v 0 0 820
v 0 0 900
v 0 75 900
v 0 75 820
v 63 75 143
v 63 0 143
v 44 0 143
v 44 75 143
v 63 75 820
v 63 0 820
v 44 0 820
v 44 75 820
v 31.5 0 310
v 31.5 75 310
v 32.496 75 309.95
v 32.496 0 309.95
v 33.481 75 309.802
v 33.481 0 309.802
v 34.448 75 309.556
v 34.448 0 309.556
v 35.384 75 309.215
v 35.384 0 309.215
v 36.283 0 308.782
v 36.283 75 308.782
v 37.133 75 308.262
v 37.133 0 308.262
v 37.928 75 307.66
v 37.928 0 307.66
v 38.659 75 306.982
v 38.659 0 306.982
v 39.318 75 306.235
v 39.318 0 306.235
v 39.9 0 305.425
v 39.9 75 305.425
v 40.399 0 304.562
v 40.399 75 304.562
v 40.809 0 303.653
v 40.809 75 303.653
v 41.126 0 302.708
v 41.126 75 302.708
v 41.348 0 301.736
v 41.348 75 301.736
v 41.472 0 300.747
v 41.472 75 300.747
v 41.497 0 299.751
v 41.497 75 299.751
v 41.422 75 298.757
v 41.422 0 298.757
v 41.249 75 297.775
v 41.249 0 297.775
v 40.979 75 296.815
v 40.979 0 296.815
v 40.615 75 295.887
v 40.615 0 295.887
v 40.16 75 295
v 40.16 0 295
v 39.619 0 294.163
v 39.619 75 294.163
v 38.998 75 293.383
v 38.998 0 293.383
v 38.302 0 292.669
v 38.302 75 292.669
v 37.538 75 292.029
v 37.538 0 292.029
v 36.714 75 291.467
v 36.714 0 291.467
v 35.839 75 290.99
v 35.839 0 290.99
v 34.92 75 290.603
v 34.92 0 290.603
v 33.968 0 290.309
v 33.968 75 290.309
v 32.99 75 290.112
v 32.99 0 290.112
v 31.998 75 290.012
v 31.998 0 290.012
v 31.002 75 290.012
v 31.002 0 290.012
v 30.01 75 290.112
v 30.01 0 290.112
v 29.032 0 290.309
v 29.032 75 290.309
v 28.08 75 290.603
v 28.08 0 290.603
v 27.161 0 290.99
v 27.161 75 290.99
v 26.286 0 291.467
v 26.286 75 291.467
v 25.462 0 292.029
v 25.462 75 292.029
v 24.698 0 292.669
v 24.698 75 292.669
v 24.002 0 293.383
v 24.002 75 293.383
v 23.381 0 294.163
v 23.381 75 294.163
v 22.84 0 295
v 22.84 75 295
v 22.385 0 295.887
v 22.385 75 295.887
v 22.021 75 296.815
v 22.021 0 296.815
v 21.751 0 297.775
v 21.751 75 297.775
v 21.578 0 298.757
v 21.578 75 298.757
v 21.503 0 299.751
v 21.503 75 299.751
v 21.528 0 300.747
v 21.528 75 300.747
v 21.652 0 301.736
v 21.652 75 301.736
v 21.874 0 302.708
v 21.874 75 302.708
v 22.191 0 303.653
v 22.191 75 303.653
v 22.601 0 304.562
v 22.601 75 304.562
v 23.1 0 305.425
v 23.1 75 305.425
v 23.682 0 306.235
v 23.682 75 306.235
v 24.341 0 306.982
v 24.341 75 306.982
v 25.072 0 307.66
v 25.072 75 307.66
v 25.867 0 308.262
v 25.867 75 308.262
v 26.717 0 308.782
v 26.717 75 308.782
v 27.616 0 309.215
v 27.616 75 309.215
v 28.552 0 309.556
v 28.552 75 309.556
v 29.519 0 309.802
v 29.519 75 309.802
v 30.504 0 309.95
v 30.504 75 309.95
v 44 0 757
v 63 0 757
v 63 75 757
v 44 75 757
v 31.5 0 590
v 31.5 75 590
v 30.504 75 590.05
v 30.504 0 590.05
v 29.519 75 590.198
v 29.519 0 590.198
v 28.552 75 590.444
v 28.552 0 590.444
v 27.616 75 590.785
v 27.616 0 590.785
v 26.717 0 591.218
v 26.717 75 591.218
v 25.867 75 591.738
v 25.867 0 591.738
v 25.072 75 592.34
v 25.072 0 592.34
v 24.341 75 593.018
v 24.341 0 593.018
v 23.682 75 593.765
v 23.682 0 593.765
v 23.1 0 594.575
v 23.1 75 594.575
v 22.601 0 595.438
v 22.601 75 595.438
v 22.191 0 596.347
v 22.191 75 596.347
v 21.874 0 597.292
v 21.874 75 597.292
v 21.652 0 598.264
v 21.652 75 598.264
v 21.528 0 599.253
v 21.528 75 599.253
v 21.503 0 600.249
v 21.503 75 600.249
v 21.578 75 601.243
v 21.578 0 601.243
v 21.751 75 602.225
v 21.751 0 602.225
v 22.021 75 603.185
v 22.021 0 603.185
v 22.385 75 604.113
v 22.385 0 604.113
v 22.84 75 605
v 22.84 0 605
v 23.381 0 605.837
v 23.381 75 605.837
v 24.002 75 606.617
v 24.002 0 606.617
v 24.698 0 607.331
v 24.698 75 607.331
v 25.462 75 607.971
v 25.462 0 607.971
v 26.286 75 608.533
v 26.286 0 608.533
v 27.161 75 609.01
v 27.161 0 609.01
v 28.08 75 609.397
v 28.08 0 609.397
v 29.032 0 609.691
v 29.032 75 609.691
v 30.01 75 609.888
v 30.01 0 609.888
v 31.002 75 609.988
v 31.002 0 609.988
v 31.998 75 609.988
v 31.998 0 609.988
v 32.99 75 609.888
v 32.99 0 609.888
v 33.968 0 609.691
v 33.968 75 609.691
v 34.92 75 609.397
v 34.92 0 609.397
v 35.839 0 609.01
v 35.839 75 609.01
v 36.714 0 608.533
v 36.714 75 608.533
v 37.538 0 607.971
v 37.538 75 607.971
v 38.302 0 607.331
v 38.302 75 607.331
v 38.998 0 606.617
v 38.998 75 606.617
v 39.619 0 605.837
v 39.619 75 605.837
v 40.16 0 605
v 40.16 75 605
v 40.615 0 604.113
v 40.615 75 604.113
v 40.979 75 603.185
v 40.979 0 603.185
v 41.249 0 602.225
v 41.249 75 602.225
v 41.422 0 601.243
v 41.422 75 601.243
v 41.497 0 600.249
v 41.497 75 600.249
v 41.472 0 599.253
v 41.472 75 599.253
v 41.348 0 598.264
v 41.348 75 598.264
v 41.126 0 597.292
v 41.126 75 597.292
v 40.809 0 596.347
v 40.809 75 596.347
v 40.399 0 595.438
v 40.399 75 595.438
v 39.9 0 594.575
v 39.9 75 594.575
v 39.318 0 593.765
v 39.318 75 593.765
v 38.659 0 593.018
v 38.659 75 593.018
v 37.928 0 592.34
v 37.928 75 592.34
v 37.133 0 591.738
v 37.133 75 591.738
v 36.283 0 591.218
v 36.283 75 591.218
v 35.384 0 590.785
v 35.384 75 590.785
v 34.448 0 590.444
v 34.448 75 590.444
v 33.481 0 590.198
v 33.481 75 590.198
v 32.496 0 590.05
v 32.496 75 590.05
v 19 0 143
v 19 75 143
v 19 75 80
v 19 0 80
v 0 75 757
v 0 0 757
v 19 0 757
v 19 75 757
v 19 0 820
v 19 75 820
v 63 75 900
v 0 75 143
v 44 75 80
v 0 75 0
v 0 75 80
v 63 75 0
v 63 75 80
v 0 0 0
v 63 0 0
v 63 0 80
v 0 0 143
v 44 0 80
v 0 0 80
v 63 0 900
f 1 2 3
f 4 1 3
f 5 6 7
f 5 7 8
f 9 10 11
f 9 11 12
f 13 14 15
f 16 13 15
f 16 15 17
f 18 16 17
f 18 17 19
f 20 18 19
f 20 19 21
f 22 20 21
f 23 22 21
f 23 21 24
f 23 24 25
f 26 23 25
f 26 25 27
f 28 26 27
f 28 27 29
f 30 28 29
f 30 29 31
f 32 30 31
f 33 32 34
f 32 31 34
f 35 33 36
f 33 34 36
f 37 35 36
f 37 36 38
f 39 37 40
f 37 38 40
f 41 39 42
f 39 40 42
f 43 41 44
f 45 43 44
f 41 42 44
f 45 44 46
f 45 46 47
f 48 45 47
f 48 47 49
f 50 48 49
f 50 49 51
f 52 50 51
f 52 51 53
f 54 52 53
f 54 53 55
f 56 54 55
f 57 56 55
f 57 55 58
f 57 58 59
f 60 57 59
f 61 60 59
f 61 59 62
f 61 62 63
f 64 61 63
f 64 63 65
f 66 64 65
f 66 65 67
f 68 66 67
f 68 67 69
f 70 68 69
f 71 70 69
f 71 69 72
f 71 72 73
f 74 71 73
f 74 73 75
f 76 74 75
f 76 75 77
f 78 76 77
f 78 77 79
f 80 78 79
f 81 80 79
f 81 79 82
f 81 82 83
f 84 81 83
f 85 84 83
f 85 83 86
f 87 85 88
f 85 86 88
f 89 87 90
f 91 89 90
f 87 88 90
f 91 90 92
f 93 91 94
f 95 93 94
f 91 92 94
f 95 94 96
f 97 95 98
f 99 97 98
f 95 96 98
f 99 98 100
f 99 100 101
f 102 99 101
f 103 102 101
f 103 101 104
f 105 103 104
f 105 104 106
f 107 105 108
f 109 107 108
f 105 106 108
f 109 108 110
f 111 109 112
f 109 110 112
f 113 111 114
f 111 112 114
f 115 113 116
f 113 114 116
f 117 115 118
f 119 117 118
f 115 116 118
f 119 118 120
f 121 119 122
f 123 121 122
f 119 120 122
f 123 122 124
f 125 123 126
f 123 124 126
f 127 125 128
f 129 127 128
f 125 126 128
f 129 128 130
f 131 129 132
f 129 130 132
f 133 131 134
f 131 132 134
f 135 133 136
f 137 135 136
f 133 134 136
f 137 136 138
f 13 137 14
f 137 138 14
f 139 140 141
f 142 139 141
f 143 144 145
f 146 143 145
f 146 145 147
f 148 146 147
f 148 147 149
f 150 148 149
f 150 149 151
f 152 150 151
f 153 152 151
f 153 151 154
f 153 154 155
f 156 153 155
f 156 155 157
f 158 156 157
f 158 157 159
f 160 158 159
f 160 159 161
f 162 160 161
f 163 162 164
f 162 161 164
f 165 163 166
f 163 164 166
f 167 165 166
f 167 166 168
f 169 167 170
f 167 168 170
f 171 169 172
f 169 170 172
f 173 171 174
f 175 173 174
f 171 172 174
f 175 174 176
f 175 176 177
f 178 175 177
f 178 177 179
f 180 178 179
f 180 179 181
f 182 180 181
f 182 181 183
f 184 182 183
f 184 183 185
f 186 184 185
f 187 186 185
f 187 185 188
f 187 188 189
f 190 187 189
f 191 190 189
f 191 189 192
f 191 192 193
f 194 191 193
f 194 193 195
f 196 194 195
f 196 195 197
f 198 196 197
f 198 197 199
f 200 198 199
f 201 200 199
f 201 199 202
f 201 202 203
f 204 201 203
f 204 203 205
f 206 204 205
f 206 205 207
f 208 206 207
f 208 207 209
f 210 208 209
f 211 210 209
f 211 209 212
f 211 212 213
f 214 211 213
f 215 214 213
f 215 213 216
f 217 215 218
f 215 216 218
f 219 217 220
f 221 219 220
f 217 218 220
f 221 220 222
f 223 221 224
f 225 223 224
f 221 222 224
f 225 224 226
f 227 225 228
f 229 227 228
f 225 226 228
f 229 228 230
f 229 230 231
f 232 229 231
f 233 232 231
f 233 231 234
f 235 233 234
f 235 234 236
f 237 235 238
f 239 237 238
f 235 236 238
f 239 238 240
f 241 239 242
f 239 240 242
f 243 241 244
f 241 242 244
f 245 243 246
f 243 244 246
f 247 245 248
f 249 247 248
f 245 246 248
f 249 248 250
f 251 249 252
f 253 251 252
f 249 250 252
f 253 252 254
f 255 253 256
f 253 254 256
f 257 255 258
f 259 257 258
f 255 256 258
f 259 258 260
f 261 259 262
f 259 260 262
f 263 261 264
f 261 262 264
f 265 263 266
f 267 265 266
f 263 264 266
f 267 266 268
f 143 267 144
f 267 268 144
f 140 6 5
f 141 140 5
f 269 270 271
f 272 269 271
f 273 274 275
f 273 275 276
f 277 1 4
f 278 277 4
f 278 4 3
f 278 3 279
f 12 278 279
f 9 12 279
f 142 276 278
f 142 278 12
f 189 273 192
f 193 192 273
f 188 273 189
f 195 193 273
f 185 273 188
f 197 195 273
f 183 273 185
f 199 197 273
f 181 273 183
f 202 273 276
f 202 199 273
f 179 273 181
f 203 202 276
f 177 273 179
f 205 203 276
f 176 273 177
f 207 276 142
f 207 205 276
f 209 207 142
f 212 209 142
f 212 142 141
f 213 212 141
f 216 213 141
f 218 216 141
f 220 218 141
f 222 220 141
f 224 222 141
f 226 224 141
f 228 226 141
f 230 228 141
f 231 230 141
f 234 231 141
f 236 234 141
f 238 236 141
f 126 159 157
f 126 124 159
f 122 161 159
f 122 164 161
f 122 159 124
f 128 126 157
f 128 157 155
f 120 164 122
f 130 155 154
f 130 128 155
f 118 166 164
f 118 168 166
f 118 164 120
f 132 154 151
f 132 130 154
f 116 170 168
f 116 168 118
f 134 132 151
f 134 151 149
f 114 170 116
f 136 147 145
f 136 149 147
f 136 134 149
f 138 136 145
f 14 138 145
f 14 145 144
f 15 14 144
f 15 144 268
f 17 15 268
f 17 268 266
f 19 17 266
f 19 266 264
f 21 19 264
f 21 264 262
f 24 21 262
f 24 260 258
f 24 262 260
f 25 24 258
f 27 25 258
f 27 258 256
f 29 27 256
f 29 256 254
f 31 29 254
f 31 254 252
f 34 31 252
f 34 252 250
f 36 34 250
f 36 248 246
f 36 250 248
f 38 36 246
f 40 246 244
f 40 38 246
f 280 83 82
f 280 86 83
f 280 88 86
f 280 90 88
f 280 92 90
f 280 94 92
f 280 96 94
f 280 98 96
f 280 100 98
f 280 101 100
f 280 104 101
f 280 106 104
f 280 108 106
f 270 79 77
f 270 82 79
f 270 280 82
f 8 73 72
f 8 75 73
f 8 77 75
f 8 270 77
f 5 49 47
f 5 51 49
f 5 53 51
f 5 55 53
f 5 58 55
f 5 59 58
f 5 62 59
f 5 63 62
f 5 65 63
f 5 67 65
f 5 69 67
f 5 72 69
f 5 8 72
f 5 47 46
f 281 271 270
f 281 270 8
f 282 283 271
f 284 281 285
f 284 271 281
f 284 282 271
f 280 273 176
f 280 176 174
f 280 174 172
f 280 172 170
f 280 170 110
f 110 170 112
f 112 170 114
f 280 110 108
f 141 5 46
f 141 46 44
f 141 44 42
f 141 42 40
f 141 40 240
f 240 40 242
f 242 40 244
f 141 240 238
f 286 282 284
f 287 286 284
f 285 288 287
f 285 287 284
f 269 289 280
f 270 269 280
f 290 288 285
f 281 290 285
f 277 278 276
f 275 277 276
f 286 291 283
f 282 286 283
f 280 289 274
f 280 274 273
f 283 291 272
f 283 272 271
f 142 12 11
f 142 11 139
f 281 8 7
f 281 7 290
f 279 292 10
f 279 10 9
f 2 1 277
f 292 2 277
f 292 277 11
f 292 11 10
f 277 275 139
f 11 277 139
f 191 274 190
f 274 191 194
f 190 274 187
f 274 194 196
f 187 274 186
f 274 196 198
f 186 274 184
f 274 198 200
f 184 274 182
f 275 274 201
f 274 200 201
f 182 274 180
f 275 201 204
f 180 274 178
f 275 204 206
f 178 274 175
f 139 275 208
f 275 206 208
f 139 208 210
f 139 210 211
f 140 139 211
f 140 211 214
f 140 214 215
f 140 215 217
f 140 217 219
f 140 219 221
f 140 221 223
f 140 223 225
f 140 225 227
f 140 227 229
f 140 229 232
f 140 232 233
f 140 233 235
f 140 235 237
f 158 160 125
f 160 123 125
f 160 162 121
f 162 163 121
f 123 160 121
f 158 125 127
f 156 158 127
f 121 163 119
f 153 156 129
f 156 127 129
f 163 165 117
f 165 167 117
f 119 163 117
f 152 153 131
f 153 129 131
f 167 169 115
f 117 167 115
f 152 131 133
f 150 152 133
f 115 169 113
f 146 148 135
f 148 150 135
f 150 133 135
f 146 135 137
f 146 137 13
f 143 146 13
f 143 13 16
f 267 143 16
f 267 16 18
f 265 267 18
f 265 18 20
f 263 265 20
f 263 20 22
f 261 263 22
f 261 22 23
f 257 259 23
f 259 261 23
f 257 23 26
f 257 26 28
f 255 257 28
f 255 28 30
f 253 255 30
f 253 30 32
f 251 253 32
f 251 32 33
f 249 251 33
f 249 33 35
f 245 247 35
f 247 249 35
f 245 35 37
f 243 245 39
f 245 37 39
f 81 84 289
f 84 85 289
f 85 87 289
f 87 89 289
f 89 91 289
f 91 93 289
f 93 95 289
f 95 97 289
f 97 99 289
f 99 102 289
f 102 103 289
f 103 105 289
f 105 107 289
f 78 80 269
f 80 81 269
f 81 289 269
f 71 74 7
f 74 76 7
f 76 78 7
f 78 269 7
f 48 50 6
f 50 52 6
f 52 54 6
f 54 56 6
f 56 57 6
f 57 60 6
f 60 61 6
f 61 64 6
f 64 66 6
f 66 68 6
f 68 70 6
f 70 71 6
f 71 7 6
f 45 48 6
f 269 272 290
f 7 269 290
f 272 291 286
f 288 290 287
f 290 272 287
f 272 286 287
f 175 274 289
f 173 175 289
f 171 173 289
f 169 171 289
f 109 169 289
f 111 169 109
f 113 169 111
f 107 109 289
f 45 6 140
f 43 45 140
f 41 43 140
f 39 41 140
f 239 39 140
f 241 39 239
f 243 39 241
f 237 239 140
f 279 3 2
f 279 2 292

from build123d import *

# Parameters (mm, degrees)
ESQUISSE1_W             = 63
ESQUISSE1_H             = 75
BOSS_EXTRU_1_DEPTH      = 900
ESQUISSE2_W             = 63
ESQUISSE2_H             = 75
ENL_V_MAT_EXTRU_1_DEPTH = 19
ENL_V_START             = -63
ESQUISSE2_2_W           = 63
ESQUISSE2_2_H           = 75
ENL_V_MAT_EXTRU_2_DEPTH = 19
ESQUISSE3_R             = 10
ENL_V_MAT_EXTRU_3_DEPTH = 906.31431006


with BuildPart() as part:
    # Esquisse1 → Boss.-Extru.1 (new body)
    with BuildSketch(Plane.XY):
        with Locations((31.5, 37.5)):
            Rectangle(ESQUISSE1_W, ESQUISSE1_H)
    extrude(amount=BOSS_EXTRU_1_DEPTH)

    # Esquisse2 → Enlèv. mat.-Extru.1 (cut)
    with BuildSketch(Plane(origin=(63, 0, 0), x_dir=(0, 0, -1), z_dir=(1, 0, 0))):
        with Locations((-788.5, 37.5)):
            Rectangle(ESQUISSE2_W, ESQUISSE2_H)
        with Locations((-111.5, 37.5)):
            Rectangle(ESQUISSE2_W, ESQUISSE2_H)
    extrude(amount=-ENL_V_MAT_EXTRU_1_DEPTH, mode=Mode.SUBTRACT)

    # Esquisse2<2> → Enlèv. mat.-Extru.2 (cut)
    with BuildSketch(Plane(origin=(63, 0, 0), x_dir=(0, 0, -1), z_dir=(1, 0, 0)).offset(ENL_V_START)):
        with Locations((-788.5, 37.5)):
            Rectangle(ESQUISSE2_2_W, ESQUISSE2_2_H)
        with Locations((-111.5, 37.5)):
            Rectangle(ESQUISSE2_2_W, ESQUISSE2_2_H)
    extrude(amount=ENL_V_MAT_EXTRU_2_DEPTH, mode=Mode.SUBTRACT)

    # Esquisse3 → Enlèv. mat.-Extru.3 (cut, through all)
    with BuildSketch(Plane(origin=(0, 75, 0), x_dir=(1, 0, 0), z_dir=(0, 1, 0))):
        with Locations(Location((31.5, -300, 0), (0, 0, 270))):
            Circle(ESQUISSE3_R)
        with Locations(Location((31.5, -600, 0), (0, 0, 90))):
            Circle(ESQUISSE3_R)
    extrude(amount=-ENL_V_MAT_EXTRU_3_DEPTH, mode=Mode.SUBTRACT)


solid = part.part
